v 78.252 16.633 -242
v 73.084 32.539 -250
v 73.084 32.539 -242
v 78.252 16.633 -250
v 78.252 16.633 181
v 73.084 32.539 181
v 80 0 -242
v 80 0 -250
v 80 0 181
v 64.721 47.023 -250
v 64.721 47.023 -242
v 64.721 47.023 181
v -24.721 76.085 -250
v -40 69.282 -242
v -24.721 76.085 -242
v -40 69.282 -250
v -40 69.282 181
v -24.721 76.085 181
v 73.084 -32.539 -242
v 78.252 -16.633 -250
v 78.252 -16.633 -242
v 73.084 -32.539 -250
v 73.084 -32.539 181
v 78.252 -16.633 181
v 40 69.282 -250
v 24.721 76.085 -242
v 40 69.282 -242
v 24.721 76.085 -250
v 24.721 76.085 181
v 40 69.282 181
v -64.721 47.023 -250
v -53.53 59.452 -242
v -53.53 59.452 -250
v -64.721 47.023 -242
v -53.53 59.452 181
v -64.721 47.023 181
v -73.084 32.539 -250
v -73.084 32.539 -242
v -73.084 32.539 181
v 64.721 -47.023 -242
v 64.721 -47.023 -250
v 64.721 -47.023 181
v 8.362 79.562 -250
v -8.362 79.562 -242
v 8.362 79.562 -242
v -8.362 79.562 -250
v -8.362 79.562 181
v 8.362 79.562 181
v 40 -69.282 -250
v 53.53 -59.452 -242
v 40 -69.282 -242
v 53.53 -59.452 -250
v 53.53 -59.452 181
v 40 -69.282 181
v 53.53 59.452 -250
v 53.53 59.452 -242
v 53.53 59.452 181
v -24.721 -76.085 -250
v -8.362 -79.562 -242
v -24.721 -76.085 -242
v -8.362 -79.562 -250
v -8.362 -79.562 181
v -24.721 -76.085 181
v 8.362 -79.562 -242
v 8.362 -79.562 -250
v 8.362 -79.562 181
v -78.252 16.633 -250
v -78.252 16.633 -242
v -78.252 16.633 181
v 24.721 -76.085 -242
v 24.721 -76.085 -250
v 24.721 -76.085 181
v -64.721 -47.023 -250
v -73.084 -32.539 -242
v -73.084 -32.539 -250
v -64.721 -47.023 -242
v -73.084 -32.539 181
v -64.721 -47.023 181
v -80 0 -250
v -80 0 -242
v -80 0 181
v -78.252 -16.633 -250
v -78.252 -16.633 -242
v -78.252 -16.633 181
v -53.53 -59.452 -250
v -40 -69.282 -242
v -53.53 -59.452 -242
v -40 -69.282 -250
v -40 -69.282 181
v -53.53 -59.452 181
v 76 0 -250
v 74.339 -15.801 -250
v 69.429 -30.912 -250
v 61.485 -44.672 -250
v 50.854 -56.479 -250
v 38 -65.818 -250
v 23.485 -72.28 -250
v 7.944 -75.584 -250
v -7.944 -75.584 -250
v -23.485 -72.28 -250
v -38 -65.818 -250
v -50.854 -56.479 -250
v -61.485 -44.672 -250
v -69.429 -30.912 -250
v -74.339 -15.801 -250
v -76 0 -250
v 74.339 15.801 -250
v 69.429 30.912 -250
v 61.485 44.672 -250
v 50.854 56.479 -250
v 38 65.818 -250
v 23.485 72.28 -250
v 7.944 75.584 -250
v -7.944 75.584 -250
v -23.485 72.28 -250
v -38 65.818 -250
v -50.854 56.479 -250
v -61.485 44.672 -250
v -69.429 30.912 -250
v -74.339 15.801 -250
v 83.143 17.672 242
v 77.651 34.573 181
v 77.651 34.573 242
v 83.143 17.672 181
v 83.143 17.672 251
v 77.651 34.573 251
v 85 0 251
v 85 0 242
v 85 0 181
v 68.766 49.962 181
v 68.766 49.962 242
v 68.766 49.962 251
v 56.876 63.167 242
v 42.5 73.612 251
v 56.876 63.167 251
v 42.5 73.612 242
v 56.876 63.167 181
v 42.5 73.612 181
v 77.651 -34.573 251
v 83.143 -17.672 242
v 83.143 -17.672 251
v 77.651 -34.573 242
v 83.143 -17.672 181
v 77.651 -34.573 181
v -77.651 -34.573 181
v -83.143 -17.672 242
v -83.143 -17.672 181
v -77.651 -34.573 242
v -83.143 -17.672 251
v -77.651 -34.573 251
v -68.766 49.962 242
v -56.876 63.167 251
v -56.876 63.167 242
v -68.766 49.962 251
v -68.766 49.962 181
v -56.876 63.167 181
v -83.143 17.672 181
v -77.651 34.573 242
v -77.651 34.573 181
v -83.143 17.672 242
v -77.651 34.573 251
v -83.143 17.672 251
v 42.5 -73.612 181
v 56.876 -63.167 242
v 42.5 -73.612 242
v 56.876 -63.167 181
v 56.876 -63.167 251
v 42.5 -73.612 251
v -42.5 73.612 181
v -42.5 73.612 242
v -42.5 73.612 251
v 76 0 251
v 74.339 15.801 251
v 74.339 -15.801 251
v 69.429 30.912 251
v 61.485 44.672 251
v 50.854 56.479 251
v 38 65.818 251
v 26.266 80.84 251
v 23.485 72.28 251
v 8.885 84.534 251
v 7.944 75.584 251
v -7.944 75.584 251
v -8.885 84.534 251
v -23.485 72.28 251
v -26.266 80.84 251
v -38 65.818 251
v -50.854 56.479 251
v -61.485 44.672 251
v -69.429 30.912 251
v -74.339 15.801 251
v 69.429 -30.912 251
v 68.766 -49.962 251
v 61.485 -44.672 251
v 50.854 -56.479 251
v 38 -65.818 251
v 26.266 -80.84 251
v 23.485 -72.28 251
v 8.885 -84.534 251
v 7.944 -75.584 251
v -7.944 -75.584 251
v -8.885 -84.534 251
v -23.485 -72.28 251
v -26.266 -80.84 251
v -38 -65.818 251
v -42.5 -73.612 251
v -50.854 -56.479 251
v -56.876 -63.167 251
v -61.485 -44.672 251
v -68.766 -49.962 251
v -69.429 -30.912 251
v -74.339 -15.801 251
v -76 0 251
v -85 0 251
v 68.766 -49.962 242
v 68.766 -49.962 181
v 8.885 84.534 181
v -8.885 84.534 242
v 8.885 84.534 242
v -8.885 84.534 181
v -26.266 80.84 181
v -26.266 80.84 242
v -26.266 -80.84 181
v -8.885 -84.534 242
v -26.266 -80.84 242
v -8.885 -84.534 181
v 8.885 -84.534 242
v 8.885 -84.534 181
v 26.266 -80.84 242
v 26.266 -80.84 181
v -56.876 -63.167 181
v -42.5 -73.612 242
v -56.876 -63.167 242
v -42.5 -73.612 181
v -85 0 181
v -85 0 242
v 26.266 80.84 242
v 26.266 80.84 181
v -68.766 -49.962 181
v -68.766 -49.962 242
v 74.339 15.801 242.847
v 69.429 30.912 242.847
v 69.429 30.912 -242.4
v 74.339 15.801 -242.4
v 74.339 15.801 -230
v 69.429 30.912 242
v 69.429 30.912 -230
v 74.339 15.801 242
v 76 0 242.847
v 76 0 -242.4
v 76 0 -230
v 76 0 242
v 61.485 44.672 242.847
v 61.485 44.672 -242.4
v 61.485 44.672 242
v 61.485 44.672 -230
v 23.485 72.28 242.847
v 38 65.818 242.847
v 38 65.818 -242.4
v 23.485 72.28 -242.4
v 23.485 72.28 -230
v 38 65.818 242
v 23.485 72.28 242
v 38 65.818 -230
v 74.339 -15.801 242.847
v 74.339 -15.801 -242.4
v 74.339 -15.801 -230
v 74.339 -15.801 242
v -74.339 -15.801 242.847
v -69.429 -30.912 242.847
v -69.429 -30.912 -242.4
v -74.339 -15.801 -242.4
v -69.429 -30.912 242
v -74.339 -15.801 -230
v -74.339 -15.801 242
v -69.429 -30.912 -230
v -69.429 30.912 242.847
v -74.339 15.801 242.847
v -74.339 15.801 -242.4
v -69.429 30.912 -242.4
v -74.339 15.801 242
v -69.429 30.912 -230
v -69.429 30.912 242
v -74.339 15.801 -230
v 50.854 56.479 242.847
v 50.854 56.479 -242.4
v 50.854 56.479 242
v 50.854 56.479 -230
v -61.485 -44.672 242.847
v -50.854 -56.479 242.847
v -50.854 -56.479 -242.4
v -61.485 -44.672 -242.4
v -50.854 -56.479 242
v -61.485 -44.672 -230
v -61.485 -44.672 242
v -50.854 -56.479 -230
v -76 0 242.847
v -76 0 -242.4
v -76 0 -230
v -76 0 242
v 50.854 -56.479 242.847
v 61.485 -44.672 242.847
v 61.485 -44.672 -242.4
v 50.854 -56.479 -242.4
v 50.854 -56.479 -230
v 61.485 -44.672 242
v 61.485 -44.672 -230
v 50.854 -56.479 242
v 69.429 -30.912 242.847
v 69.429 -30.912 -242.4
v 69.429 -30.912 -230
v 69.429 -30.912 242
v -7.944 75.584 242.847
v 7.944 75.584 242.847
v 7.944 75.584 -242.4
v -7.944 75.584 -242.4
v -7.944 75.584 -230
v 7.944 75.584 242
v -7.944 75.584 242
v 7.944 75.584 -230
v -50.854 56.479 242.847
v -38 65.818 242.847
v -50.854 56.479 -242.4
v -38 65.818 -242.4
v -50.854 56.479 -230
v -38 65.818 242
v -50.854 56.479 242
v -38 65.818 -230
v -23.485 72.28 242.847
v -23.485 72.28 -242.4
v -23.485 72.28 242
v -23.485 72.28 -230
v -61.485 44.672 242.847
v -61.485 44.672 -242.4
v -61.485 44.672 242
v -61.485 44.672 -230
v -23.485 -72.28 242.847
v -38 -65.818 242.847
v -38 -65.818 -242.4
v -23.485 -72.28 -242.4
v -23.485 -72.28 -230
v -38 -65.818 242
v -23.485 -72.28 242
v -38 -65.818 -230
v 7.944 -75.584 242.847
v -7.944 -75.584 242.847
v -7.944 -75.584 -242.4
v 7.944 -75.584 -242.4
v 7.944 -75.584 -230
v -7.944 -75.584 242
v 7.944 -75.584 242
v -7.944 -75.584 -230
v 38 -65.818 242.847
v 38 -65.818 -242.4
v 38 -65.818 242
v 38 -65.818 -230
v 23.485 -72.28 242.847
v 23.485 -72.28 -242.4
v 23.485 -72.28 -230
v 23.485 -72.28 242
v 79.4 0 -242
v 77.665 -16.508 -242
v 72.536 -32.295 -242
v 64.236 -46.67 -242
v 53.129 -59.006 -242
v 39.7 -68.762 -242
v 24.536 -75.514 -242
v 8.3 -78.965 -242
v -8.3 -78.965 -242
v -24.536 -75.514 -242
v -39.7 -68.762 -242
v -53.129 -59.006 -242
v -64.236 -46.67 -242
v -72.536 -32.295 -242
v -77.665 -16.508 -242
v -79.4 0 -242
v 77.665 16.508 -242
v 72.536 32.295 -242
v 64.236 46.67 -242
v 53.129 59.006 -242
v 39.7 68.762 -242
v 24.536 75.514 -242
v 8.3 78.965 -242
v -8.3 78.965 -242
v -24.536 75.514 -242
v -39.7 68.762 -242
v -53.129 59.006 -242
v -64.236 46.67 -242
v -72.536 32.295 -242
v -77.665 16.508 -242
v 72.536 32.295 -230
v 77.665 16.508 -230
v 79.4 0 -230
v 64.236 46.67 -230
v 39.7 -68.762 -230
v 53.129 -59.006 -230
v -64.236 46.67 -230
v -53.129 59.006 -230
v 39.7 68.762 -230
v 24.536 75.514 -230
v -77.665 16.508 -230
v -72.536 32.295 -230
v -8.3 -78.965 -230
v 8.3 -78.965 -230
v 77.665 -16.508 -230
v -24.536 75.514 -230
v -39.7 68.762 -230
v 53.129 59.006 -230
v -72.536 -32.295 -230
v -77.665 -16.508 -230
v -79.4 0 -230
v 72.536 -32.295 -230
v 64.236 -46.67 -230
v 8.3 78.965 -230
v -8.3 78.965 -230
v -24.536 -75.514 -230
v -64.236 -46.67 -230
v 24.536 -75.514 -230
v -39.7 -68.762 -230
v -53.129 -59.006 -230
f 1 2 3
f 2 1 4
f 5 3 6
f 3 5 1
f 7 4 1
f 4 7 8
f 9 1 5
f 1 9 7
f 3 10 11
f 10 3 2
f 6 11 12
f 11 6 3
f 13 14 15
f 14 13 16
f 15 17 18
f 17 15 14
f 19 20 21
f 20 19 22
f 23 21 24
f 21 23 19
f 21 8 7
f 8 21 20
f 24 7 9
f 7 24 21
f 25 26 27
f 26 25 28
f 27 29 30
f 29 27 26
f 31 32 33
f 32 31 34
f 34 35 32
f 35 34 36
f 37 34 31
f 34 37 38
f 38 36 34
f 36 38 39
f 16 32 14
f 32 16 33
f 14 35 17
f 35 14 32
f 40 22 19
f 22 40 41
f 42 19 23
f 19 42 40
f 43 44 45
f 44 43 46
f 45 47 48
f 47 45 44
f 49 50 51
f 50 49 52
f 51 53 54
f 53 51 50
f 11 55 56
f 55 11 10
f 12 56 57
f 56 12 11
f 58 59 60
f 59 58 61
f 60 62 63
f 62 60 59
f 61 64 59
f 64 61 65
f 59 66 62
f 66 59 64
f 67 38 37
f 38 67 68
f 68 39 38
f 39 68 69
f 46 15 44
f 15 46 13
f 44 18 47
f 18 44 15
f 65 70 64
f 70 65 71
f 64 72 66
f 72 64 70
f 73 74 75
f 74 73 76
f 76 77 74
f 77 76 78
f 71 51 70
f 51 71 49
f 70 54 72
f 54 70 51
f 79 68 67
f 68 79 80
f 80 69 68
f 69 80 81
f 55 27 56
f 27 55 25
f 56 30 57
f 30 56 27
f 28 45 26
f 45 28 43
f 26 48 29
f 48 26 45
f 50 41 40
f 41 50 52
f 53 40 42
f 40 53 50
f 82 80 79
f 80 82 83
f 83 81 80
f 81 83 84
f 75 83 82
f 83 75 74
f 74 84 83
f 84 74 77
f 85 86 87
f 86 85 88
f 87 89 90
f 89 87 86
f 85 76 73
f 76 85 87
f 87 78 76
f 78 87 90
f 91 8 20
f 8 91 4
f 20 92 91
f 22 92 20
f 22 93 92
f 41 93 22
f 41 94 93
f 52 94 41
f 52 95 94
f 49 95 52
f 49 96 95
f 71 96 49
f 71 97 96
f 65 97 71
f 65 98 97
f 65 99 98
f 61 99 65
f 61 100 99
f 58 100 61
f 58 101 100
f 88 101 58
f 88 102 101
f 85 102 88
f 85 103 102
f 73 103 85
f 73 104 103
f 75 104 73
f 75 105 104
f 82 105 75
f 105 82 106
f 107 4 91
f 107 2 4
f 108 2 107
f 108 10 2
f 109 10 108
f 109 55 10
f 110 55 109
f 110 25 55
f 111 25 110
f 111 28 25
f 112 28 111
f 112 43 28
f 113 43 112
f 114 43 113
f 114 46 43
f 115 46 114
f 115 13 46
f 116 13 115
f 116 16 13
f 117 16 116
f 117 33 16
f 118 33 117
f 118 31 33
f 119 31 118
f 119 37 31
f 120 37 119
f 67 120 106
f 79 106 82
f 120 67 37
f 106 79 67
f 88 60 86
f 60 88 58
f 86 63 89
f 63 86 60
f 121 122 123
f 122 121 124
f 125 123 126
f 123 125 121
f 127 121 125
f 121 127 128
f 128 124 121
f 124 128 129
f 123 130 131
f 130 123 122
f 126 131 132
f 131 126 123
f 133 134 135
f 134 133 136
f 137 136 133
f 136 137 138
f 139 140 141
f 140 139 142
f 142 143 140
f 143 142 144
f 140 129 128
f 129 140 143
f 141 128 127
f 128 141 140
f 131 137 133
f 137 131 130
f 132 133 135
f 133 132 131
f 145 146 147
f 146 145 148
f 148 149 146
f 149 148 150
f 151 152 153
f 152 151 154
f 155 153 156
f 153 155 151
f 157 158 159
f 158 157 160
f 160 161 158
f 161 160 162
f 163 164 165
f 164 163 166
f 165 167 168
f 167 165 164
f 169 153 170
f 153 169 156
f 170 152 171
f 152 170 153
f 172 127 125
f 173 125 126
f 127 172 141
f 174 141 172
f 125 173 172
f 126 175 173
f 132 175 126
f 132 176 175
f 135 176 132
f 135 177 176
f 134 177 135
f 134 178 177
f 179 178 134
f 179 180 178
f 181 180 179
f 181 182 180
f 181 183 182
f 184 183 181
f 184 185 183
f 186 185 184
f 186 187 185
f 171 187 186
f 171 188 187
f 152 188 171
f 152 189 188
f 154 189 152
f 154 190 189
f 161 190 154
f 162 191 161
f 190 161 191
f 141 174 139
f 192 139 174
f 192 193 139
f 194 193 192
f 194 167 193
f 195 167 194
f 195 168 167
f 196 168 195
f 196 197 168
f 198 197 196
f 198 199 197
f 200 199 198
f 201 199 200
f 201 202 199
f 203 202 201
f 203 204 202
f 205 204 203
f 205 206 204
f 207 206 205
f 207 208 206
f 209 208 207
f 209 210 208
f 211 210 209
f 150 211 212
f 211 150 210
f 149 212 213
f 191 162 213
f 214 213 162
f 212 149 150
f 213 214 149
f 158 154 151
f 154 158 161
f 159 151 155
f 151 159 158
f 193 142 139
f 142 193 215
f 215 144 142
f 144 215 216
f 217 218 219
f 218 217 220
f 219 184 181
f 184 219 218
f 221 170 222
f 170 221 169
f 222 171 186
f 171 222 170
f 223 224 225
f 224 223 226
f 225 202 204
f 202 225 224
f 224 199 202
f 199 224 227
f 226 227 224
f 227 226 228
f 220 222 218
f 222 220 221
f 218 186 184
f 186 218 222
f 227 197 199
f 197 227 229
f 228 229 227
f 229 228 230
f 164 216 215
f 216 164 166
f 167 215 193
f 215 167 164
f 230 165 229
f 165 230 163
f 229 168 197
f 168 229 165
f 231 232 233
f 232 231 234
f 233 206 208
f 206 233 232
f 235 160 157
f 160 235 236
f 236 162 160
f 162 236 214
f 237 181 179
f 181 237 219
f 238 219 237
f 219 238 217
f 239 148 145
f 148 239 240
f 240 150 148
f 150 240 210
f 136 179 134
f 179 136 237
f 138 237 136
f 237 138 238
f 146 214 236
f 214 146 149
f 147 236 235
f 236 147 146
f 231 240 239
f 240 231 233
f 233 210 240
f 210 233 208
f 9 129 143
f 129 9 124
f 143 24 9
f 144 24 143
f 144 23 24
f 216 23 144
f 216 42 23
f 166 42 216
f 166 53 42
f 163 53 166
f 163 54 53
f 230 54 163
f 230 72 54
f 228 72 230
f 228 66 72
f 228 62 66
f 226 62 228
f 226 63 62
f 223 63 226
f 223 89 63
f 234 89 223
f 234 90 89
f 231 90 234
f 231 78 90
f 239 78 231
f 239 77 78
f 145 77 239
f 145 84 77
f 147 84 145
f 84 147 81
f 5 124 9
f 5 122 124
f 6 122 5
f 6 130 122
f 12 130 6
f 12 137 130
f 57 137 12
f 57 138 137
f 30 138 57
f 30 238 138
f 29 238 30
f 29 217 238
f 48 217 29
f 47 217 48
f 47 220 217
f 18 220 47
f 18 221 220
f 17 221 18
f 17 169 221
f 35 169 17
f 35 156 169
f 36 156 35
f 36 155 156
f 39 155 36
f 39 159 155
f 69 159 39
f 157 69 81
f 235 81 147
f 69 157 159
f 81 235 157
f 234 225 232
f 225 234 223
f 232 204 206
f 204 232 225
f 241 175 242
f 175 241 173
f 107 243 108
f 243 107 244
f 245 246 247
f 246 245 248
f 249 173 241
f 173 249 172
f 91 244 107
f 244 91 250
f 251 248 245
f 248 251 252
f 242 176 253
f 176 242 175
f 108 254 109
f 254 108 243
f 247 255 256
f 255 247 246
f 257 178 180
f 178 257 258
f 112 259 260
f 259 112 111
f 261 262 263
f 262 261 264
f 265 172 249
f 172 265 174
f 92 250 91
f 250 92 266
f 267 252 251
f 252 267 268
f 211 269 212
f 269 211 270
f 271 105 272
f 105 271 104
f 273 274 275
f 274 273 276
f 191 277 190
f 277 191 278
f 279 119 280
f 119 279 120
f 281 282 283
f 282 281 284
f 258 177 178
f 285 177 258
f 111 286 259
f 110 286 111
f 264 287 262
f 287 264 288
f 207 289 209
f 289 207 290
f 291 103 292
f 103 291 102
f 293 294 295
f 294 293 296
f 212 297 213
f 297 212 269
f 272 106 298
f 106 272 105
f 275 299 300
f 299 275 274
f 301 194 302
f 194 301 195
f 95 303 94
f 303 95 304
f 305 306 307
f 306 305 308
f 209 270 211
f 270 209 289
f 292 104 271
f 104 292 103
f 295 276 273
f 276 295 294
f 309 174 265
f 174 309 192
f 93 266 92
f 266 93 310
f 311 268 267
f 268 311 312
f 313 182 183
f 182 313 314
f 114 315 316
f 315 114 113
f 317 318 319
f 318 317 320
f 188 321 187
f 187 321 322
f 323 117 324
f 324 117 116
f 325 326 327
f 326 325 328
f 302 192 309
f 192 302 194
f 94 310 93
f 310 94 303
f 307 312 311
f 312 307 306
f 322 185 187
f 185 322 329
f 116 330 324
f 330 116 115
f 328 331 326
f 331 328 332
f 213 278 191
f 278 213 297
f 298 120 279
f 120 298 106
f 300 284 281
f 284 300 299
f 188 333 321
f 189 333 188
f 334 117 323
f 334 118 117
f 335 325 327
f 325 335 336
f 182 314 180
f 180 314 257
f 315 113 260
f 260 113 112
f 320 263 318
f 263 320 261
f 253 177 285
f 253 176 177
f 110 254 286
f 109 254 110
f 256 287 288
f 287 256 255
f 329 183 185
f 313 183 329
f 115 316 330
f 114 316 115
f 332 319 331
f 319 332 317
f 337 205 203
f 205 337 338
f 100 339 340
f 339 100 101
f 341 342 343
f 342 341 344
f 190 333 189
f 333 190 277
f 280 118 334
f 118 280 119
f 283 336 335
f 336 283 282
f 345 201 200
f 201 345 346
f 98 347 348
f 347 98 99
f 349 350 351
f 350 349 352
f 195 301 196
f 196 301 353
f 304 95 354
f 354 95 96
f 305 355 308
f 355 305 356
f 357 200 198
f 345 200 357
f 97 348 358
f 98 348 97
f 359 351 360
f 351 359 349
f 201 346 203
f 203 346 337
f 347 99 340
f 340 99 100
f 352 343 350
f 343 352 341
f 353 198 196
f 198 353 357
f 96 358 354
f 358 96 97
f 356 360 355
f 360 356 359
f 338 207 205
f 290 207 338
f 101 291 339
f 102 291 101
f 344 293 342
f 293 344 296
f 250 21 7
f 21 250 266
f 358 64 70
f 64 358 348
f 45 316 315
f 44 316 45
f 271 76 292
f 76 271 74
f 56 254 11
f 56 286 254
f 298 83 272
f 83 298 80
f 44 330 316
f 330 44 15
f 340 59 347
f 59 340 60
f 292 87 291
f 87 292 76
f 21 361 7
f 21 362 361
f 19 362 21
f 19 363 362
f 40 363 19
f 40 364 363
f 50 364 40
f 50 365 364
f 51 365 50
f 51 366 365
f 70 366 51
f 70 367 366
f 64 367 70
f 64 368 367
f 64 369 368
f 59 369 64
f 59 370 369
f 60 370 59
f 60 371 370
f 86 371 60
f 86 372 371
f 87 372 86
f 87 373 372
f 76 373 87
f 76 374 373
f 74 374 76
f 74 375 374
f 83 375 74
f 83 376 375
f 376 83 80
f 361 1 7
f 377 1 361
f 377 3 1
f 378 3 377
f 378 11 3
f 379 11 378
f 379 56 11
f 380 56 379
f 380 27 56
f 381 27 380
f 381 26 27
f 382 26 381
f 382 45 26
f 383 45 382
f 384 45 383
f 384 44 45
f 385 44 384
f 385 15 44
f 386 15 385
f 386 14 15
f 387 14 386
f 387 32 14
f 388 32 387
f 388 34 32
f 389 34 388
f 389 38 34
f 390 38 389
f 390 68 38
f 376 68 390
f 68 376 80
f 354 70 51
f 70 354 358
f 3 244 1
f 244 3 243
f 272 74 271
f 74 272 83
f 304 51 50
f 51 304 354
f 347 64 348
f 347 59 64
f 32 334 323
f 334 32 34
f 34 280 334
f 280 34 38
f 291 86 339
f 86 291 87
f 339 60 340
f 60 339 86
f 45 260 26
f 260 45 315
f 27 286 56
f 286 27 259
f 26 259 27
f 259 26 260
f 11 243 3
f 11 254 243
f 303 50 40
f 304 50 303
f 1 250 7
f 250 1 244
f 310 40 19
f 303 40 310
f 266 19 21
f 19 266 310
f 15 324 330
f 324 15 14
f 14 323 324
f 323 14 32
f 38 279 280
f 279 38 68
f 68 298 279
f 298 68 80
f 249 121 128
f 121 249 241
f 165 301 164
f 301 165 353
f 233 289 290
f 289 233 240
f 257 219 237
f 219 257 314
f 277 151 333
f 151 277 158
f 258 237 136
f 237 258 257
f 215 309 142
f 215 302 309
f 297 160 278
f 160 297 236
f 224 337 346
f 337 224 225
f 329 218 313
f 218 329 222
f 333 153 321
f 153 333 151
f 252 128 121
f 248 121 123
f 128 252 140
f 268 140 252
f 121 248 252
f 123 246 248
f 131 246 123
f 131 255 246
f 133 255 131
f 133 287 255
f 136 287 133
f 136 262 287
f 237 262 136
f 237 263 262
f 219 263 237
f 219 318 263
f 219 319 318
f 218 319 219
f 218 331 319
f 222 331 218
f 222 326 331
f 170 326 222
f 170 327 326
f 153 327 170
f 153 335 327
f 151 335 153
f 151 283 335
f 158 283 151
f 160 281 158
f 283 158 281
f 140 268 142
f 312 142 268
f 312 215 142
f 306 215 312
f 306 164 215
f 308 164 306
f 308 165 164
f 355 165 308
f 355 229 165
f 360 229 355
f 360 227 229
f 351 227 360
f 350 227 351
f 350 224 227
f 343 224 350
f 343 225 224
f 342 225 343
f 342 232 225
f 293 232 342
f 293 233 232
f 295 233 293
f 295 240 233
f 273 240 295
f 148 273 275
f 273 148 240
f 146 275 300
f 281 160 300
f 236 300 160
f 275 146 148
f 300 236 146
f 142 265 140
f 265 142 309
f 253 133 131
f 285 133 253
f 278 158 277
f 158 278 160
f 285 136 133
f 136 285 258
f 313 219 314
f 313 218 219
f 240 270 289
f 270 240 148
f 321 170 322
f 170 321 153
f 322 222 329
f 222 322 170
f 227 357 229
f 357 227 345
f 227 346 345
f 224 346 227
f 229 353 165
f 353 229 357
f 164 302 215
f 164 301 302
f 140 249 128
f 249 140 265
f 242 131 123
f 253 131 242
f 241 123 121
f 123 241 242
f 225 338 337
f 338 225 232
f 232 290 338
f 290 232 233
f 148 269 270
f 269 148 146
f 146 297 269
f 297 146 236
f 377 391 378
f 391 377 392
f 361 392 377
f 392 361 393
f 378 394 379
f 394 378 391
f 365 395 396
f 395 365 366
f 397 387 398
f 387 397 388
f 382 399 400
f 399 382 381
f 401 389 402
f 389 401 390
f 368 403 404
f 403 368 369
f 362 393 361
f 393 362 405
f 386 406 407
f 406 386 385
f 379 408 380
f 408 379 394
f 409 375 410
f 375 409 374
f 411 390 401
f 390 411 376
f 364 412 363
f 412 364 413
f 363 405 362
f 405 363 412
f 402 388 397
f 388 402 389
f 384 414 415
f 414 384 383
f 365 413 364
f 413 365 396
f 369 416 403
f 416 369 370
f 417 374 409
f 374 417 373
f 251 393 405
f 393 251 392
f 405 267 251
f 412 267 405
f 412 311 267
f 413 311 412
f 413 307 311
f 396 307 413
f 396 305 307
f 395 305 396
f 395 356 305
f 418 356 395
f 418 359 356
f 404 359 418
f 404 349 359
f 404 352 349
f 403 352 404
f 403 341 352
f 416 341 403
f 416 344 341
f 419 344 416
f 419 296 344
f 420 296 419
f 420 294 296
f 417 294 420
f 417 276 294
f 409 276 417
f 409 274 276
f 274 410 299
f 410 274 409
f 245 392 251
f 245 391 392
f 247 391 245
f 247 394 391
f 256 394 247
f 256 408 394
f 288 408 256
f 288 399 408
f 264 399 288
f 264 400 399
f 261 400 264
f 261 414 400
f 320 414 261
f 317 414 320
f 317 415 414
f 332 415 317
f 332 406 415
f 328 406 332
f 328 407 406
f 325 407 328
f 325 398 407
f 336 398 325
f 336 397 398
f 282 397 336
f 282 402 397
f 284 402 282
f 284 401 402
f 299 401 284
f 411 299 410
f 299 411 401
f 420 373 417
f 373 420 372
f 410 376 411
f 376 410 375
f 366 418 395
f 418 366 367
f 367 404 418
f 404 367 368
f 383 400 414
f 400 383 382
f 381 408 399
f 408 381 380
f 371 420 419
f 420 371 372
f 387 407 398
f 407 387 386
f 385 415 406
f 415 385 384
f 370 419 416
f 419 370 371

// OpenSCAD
// Parameters
pipe_OD = 160; //[80:320:1]
pipe_L = 500; //[250:1000:1]
wall_t = 4; //[2:8:0.5]
socket_L = 70; //[35:140:1]
socket_extra_OD = 10; //[5:20:0.5]
chamfer_L = 8; //[3:16:0.5]
marking_band_w = 12; //[6:24:0.5]
marking_band_depth = 0.6; //[0.2:1.5:0.1]
overlap = 1; //[0.5:2:0.1]

// Base Shapes
module pipe_body_outer() {
  translate([0, 0, 0])
    cylinder(h=pipe_L, r=pipe_OD/2, center=true);
}

module socket_end_outer() {
  translate([0, 0, pipe_L/2 - socket_L/2 + overlap])
    cylinder(h=socket_L, r=(pipe_OD + socket_extra_OD)/2, center=true);
}

module inner_bore() {
  translate([0, 0, 0])
    cylinder(h=pipe_L + 2*overlap, r=pipe_OD/2 - wall_t, center=true);
}

module chamfer_cut_spigot() {
  translate([0, 0, -pipe_L/2 + chamfer_L/2])
    rotate([180, 0, 0])
      cylinder(h=chamfer_L, r1=pipe_OD/2, r2=0, center=true);
}

module chamfer_cut_socket() {
  translate([0, 0, pipe_L/2 - chamfer_L/2])
    cylinder(h=chamfer_L, r1=(pipe_OD + socket_extra_OD)/2, r2=0, center=true);
}

module marking_band_cut() {
  translate([0, 0, -pipe_L/2 + chamfer_L + marking_band_w/2])
    cylinder(h=marking_band_w, r=pipe_OD/2 - marking_band_depth, center=true);
}

// Operations
module outer_with_socket() {
  union() {
    pipe_body_outer();
    socket_end_outer();
  }
}

module pipe_hollow() {
  difference() {
    outer_with_socket();
    inner_bore();
  }
}

module pipe_with_chamfers() {
  difference() {
    pipe_hollow();
    chamfer_cut_spigot();
    chamfer_cut_socket();
  }
}

module pipe_with_markings() {
  difference() {
    pipe_with_chamfers();
    marking_band_cut();
  }
}

// Final Output
pipe_with_markings();
